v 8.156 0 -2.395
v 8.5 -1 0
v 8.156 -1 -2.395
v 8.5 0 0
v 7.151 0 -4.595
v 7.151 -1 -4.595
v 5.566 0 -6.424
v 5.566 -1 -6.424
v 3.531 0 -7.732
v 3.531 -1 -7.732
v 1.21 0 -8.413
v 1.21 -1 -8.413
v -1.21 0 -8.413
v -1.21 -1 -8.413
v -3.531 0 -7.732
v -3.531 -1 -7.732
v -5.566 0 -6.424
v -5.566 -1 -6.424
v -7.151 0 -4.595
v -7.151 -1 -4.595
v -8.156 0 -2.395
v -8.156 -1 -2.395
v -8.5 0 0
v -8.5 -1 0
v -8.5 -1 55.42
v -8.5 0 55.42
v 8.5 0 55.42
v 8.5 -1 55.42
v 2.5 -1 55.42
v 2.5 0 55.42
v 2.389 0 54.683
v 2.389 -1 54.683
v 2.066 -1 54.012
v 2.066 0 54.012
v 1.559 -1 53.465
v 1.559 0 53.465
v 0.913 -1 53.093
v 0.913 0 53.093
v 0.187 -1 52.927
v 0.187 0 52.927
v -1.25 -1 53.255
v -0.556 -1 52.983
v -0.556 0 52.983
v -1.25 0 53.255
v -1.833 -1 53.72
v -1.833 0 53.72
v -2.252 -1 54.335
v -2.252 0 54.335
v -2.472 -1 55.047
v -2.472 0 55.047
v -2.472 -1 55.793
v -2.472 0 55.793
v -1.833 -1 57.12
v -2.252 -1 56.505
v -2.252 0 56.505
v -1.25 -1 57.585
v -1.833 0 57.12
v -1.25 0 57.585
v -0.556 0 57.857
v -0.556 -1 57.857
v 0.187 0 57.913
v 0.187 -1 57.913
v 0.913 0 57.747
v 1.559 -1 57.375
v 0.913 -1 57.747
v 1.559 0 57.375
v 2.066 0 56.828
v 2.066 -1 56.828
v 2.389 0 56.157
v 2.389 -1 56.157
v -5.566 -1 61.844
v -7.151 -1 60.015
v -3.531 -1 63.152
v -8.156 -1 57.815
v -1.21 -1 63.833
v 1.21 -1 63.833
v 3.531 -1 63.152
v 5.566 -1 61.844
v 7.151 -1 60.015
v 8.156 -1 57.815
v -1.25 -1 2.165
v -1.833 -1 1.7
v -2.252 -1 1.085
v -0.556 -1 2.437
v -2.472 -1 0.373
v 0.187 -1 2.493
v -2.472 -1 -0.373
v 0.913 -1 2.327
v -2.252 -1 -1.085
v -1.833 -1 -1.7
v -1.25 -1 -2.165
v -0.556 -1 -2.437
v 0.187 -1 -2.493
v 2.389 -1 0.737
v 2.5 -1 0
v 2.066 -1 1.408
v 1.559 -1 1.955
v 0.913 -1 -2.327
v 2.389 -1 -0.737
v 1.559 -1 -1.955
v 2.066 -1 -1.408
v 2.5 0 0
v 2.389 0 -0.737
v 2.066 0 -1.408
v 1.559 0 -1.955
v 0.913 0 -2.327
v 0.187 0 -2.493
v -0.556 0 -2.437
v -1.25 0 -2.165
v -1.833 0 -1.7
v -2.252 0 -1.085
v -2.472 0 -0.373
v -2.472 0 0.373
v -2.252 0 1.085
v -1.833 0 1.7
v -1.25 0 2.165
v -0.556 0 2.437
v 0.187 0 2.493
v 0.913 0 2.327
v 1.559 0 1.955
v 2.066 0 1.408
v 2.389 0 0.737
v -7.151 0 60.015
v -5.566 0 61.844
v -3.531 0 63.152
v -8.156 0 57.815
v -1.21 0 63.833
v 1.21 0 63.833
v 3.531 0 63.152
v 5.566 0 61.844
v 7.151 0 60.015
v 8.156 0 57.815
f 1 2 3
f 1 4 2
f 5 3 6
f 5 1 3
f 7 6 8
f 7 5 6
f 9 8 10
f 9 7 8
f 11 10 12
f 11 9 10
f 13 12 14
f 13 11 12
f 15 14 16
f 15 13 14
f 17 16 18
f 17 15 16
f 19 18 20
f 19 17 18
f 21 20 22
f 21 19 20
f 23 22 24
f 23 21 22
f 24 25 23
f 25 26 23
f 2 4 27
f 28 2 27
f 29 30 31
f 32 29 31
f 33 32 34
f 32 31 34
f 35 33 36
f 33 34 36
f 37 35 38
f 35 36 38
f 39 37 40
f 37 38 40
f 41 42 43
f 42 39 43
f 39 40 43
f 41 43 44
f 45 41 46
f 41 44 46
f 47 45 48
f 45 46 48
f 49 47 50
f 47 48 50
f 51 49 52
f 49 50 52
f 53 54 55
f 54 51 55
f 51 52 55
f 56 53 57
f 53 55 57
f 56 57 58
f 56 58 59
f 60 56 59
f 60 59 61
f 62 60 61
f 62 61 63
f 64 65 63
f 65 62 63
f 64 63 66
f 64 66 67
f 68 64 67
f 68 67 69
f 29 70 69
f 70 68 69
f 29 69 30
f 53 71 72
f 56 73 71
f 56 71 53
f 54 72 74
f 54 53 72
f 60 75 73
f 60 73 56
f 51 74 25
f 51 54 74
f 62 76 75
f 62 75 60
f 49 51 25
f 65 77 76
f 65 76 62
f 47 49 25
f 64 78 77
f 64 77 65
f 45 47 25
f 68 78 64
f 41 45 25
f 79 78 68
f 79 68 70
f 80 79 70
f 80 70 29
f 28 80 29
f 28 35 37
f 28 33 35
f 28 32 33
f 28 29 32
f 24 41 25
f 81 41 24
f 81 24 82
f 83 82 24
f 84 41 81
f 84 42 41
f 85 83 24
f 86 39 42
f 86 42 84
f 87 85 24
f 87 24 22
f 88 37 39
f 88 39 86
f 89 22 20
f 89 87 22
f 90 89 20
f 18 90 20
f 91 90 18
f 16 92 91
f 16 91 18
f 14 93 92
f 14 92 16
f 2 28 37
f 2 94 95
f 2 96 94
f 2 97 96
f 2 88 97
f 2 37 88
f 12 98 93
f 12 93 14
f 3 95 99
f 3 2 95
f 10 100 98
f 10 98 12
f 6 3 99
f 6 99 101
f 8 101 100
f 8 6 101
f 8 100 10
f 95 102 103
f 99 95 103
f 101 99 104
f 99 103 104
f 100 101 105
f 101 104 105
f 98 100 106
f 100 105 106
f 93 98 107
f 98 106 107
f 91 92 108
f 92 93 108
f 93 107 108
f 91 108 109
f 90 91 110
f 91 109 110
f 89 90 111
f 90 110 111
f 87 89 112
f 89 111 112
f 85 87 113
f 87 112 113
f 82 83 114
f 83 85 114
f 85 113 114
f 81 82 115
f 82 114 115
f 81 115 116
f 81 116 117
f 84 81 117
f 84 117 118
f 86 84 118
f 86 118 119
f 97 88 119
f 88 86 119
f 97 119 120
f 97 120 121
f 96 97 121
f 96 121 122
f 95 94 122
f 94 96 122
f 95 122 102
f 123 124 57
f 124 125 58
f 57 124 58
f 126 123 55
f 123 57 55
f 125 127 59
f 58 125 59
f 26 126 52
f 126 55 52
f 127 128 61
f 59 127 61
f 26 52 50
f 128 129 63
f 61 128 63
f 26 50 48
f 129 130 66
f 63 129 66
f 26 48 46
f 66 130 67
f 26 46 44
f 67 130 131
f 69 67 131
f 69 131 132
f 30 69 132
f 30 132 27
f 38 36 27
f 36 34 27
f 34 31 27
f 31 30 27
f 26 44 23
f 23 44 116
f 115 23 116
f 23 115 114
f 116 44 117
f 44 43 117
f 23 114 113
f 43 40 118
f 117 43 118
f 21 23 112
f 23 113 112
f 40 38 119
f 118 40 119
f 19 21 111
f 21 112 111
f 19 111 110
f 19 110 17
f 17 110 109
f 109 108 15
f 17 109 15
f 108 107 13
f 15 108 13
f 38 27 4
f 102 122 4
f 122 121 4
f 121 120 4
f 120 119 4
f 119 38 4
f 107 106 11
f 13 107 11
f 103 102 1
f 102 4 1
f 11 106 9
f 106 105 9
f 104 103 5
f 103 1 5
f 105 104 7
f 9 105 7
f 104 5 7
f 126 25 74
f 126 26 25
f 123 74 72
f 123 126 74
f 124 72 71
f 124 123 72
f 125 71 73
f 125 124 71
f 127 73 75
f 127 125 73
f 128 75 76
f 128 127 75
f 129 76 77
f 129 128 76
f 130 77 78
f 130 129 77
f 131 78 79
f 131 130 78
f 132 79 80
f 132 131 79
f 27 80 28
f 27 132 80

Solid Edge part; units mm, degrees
sketch "Sketch1" plane through (0, 0, 0) normal (0, -1, 0) x (1, 0, 0)
  line L0 (8.5, 0) -> (8.5, 55.42)
  line L1 (-8.5, 55.42) -> (-8.5, 0)
  arc A0 (-8.5, 55.42) -> (8.5, 55.42) centre (0, 55.42) cw
  arc A1 (8.5, 0) -> (-8.5, 0) centre (0, 0) cw
  circle A2 centre (0, 55.42) radius 2.5
  circle A3 centre (0, 0) radius 2.5
extrude "Protrusion1" add sketch "Sketch1" along normal blind 1
